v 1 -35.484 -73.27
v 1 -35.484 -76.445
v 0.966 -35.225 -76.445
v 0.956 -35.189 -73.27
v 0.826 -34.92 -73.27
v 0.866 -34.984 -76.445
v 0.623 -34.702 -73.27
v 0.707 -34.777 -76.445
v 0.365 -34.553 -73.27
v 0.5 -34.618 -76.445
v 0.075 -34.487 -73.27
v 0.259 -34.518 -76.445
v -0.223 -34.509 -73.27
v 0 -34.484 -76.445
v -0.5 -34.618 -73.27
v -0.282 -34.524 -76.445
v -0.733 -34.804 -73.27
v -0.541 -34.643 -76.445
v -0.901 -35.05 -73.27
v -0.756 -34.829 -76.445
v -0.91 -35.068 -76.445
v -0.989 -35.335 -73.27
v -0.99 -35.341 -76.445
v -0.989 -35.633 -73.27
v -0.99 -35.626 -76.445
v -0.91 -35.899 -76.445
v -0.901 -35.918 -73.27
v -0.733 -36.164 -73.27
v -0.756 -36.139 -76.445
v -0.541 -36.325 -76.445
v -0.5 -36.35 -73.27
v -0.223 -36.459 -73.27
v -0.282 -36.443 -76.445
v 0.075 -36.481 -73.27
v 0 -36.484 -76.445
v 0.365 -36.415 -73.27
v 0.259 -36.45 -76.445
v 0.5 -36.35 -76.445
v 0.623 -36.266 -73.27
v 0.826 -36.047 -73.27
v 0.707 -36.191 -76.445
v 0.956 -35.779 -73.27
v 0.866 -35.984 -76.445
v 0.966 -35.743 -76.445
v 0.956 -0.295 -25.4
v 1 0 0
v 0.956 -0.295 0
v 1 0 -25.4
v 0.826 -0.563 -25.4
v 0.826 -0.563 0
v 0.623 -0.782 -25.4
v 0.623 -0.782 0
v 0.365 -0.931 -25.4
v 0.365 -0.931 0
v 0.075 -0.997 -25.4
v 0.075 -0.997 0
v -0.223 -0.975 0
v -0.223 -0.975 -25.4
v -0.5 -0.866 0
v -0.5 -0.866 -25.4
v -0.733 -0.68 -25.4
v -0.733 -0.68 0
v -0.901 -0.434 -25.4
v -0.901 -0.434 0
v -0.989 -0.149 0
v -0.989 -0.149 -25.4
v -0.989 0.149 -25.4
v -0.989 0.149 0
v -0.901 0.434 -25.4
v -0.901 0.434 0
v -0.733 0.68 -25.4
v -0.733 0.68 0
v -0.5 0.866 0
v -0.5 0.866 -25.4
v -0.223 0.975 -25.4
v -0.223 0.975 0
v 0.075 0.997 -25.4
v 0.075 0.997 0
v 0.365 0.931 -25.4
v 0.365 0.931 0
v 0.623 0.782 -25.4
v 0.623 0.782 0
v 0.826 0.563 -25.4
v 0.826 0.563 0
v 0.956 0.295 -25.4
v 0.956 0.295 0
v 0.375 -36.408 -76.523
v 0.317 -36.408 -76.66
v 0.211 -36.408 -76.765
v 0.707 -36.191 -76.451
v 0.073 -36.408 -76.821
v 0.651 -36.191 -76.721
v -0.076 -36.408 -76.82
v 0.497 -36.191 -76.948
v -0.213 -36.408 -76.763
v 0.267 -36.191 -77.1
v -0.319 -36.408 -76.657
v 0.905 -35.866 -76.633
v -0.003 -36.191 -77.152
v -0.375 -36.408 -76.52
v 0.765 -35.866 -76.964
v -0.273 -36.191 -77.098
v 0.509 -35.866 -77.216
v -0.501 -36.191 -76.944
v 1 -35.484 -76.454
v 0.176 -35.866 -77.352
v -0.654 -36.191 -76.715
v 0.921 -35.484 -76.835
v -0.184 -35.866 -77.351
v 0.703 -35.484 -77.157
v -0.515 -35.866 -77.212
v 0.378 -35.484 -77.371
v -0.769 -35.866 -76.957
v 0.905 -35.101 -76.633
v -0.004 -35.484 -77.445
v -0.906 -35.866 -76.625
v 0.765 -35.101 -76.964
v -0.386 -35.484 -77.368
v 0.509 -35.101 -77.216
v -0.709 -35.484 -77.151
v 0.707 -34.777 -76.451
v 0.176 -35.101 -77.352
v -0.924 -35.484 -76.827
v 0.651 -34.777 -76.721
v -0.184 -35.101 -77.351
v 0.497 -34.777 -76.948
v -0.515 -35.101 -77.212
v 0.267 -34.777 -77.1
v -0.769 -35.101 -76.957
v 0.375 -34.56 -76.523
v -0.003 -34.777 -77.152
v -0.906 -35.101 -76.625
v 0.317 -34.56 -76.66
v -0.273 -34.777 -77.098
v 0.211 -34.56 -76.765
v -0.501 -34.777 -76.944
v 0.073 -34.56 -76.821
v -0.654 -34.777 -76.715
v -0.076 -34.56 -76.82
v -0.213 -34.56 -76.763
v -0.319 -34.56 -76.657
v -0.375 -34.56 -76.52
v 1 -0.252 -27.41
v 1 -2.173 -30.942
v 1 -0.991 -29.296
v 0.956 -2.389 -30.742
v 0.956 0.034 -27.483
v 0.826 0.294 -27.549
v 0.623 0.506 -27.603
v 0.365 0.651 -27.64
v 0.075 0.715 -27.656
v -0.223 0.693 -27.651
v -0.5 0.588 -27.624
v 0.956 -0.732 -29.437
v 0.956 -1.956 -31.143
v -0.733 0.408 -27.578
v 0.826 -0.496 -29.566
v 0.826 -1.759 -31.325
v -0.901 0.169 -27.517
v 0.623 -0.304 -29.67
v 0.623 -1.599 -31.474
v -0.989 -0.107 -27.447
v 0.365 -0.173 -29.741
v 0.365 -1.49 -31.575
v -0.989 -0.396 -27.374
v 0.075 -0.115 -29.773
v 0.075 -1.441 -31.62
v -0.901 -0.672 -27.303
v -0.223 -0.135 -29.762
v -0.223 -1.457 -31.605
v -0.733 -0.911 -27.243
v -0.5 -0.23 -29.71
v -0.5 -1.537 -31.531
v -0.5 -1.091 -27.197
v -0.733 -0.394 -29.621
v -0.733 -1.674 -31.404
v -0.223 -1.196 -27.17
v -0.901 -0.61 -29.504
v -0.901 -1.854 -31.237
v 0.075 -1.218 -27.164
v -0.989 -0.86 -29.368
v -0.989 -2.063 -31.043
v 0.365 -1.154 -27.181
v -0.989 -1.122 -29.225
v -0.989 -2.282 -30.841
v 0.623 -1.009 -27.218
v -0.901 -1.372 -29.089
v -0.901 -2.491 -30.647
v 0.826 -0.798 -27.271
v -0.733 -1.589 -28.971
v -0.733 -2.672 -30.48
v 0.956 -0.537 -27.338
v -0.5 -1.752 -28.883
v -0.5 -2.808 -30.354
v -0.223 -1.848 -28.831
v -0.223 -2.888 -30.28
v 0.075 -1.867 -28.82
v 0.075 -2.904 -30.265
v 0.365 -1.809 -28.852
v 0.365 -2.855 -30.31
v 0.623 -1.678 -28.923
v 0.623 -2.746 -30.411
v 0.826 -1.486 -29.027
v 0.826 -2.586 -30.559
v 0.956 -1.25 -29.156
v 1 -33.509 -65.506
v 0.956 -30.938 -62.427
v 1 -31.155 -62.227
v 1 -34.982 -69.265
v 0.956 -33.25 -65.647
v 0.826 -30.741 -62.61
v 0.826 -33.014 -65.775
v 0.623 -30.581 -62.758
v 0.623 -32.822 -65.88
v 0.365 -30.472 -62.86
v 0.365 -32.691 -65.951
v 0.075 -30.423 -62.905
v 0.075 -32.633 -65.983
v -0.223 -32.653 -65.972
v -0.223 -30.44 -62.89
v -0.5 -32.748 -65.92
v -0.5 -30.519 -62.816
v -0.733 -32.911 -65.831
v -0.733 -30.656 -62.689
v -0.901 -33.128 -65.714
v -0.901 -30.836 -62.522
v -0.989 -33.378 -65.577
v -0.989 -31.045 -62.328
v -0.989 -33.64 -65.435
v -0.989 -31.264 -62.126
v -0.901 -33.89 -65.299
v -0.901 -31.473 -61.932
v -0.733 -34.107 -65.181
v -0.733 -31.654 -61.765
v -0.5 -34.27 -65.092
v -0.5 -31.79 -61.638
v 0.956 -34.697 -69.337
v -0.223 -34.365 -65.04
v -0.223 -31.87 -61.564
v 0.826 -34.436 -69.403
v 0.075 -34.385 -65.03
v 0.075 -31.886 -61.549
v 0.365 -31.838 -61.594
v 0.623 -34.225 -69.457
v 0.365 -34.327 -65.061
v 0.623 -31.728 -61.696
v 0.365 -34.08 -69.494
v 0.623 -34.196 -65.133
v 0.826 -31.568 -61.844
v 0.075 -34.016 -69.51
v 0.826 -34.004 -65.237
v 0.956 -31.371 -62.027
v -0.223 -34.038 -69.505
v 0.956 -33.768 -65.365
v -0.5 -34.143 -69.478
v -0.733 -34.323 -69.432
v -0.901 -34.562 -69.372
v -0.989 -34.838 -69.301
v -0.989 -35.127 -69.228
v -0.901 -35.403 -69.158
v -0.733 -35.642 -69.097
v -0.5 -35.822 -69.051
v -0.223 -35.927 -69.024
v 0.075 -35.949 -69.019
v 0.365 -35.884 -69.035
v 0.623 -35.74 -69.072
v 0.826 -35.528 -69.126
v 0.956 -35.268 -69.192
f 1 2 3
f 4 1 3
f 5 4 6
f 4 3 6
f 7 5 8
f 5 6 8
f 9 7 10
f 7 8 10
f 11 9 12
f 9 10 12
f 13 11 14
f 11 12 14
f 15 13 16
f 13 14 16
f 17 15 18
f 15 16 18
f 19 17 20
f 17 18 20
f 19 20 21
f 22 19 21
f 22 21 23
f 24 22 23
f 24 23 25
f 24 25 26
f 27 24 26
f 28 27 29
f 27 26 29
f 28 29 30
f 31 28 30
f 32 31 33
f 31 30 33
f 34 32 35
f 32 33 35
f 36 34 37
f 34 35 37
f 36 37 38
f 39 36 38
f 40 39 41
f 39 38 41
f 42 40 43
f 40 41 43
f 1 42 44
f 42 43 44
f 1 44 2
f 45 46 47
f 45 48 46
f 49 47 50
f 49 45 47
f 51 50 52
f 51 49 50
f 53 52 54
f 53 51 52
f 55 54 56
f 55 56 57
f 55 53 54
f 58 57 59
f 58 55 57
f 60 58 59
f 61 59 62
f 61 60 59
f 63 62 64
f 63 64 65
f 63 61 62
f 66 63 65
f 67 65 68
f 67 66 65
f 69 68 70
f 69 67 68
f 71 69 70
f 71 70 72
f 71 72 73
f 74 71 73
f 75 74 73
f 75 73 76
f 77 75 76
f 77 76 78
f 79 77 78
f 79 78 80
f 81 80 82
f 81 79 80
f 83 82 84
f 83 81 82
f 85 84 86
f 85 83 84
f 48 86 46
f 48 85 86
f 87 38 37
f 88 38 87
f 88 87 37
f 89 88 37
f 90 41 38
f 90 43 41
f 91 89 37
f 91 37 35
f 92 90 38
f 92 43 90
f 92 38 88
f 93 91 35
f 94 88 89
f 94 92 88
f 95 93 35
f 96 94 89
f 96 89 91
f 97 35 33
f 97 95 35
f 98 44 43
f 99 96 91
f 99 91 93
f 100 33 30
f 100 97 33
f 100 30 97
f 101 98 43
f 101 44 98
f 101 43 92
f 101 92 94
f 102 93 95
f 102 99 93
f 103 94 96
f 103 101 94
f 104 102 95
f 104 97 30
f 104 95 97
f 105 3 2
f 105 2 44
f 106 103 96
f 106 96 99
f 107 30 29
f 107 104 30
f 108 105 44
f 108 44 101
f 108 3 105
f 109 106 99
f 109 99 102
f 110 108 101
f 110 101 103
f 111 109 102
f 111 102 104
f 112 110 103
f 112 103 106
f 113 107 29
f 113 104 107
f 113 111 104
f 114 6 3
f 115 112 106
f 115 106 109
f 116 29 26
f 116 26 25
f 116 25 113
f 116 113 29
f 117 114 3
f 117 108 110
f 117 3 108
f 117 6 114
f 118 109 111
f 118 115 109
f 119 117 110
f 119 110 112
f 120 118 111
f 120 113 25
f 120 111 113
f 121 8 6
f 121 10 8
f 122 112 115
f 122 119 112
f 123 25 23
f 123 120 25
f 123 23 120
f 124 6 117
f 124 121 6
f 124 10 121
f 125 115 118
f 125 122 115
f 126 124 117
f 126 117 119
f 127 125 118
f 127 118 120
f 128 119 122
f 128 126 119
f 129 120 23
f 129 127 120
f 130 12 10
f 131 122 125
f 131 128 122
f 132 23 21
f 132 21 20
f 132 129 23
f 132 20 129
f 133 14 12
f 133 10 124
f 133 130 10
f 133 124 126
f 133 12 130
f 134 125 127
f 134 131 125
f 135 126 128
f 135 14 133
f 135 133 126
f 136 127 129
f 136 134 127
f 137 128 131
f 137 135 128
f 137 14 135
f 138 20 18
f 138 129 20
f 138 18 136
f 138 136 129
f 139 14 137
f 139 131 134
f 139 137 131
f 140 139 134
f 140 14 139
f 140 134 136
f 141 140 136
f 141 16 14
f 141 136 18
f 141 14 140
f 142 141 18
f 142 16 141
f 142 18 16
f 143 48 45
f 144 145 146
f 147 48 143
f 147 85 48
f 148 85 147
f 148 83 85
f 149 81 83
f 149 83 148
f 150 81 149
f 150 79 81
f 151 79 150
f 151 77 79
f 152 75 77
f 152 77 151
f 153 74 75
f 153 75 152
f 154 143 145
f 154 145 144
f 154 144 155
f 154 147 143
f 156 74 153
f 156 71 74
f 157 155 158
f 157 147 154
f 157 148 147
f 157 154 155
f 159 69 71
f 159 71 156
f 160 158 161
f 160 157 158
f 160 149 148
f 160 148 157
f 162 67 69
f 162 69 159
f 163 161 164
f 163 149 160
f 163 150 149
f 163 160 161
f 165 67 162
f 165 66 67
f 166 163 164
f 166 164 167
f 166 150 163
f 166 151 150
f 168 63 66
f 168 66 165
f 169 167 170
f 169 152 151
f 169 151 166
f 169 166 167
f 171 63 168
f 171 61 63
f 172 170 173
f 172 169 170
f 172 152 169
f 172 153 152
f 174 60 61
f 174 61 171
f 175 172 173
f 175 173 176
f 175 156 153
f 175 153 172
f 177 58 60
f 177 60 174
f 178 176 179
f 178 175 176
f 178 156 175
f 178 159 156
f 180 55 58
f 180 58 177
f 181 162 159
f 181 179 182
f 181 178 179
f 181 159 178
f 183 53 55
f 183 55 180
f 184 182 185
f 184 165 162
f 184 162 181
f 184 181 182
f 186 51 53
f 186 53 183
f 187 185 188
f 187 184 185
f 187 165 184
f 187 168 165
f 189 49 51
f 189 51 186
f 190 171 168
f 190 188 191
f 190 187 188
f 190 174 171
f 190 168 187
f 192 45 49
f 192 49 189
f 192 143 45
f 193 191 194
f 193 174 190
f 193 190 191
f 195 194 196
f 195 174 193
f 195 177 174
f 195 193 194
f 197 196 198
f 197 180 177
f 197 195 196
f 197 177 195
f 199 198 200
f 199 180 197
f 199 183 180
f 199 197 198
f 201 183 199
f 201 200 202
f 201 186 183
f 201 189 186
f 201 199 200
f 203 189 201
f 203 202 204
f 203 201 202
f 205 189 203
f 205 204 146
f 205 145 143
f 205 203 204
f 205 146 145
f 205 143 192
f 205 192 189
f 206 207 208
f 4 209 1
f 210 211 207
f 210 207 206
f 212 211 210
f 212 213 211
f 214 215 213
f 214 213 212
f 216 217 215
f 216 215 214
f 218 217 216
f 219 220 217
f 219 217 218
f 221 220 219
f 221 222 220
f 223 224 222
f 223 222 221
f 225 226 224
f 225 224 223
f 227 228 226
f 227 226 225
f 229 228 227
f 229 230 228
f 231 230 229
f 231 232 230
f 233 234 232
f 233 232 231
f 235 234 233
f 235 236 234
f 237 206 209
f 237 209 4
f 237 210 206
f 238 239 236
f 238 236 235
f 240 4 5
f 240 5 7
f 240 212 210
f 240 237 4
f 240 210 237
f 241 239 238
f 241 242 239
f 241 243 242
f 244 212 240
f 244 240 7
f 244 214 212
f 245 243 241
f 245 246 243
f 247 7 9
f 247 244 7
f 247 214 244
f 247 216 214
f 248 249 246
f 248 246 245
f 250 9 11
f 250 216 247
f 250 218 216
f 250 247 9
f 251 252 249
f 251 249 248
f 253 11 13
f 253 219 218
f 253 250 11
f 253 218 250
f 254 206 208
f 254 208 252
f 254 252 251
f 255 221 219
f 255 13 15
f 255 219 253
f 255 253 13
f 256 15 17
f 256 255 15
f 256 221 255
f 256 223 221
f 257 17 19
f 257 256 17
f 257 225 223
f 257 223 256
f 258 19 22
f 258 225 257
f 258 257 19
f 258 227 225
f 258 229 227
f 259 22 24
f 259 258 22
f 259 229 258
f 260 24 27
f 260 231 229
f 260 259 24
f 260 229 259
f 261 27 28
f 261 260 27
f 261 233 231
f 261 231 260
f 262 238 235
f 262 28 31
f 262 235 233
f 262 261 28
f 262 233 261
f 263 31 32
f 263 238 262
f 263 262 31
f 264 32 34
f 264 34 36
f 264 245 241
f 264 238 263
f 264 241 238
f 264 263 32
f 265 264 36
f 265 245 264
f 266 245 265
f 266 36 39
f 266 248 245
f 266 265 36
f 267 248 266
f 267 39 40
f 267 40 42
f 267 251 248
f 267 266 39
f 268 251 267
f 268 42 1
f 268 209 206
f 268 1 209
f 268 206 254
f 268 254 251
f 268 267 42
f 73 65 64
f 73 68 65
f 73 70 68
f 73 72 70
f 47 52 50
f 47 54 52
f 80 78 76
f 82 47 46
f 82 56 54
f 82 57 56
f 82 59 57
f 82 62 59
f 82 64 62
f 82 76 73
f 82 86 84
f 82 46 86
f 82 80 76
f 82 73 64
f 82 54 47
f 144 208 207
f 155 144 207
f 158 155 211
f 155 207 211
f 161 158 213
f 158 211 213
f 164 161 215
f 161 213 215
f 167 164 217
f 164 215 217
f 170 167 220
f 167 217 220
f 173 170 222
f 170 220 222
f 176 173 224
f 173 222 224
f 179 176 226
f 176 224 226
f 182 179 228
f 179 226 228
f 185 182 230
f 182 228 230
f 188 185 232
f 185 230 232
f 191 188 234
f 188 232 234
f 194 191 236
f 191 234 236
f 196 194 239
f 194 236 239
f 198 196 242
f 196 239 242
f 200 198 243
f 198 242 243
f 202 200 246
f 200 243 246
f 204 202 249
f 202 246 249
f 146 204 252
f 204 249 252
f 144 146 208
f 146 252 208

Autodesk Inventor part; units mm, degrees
ref_plane "YZ Plane" through (0, 0, 0) normal (1, 0, 0) x (0, 1, 0)
ref_plane "XZ Plane" through (0, 0, 0) normal (0, 1, 0) x (-1, 0, 0)
ref_plane "XY Plane" through (0, 0, 0) normal (0, 0, 1) x (1, 0, 0)
sketch "Sketch2" plane through (0, 0, 0) normal (1, 0, 0) x (0, 1, 0)
  line L0 (0, 0) -> (0, -25.4)
  arc A0 (-2.1726, -30.9422) -> (0, -25.4) centre (-8.1552, -25.4) ccw
  line L1 (-2.1726, -30.9422) -> (-31.1547, -62.227)
  arc A1 (-31.1547, -62.227) -> (-35.4838, -73.2701) centre (-19.2342, -73.2701) ccw
  line L2 (-35.4838, -73.2701) -> (-35.4838, -76.4451)
  dimension "d3" = 25.4
  dimension "d4" = 8.1552
  dimension "d5" = 16.2496
  dimension "d6" = 3.175
  dimension "d7" = 35.4838
sketch "Sketch3" plane through (0, 0, 0) normal (0, 0, 1) x (1, 0, 0)
  circle A0 centre (0, 0) radius 1
  dimension "d8" = 2
sweep "Sweep1" add profiles "Sketch3" path "Sketch2"
sketch "Sketch4" plane through (0, 0, 0) normal (1, 0, 0) x (0, 1, 0)
  line L0 (-36.4838, -76.4451) -> (-34.4838, -76.4451) projected
  line L1 (-34.4838, -73.2701) -> (-34.4838, -76.4451) projected
  arc A0 (-36.4838, -76.4451) -> (-34.4838, -76.4451) centre (-35.4838, -76.4451) ccw
  point P0 (0, 0)
revolve "Revolution1" add sketch "Sketch4" angle 180 mid plane about axis through (0, -36.4838, -76.4451) along (0, 1, 0)
properties part number "2mmToRudder" material "Brass, Soft Yellow, Welded"
